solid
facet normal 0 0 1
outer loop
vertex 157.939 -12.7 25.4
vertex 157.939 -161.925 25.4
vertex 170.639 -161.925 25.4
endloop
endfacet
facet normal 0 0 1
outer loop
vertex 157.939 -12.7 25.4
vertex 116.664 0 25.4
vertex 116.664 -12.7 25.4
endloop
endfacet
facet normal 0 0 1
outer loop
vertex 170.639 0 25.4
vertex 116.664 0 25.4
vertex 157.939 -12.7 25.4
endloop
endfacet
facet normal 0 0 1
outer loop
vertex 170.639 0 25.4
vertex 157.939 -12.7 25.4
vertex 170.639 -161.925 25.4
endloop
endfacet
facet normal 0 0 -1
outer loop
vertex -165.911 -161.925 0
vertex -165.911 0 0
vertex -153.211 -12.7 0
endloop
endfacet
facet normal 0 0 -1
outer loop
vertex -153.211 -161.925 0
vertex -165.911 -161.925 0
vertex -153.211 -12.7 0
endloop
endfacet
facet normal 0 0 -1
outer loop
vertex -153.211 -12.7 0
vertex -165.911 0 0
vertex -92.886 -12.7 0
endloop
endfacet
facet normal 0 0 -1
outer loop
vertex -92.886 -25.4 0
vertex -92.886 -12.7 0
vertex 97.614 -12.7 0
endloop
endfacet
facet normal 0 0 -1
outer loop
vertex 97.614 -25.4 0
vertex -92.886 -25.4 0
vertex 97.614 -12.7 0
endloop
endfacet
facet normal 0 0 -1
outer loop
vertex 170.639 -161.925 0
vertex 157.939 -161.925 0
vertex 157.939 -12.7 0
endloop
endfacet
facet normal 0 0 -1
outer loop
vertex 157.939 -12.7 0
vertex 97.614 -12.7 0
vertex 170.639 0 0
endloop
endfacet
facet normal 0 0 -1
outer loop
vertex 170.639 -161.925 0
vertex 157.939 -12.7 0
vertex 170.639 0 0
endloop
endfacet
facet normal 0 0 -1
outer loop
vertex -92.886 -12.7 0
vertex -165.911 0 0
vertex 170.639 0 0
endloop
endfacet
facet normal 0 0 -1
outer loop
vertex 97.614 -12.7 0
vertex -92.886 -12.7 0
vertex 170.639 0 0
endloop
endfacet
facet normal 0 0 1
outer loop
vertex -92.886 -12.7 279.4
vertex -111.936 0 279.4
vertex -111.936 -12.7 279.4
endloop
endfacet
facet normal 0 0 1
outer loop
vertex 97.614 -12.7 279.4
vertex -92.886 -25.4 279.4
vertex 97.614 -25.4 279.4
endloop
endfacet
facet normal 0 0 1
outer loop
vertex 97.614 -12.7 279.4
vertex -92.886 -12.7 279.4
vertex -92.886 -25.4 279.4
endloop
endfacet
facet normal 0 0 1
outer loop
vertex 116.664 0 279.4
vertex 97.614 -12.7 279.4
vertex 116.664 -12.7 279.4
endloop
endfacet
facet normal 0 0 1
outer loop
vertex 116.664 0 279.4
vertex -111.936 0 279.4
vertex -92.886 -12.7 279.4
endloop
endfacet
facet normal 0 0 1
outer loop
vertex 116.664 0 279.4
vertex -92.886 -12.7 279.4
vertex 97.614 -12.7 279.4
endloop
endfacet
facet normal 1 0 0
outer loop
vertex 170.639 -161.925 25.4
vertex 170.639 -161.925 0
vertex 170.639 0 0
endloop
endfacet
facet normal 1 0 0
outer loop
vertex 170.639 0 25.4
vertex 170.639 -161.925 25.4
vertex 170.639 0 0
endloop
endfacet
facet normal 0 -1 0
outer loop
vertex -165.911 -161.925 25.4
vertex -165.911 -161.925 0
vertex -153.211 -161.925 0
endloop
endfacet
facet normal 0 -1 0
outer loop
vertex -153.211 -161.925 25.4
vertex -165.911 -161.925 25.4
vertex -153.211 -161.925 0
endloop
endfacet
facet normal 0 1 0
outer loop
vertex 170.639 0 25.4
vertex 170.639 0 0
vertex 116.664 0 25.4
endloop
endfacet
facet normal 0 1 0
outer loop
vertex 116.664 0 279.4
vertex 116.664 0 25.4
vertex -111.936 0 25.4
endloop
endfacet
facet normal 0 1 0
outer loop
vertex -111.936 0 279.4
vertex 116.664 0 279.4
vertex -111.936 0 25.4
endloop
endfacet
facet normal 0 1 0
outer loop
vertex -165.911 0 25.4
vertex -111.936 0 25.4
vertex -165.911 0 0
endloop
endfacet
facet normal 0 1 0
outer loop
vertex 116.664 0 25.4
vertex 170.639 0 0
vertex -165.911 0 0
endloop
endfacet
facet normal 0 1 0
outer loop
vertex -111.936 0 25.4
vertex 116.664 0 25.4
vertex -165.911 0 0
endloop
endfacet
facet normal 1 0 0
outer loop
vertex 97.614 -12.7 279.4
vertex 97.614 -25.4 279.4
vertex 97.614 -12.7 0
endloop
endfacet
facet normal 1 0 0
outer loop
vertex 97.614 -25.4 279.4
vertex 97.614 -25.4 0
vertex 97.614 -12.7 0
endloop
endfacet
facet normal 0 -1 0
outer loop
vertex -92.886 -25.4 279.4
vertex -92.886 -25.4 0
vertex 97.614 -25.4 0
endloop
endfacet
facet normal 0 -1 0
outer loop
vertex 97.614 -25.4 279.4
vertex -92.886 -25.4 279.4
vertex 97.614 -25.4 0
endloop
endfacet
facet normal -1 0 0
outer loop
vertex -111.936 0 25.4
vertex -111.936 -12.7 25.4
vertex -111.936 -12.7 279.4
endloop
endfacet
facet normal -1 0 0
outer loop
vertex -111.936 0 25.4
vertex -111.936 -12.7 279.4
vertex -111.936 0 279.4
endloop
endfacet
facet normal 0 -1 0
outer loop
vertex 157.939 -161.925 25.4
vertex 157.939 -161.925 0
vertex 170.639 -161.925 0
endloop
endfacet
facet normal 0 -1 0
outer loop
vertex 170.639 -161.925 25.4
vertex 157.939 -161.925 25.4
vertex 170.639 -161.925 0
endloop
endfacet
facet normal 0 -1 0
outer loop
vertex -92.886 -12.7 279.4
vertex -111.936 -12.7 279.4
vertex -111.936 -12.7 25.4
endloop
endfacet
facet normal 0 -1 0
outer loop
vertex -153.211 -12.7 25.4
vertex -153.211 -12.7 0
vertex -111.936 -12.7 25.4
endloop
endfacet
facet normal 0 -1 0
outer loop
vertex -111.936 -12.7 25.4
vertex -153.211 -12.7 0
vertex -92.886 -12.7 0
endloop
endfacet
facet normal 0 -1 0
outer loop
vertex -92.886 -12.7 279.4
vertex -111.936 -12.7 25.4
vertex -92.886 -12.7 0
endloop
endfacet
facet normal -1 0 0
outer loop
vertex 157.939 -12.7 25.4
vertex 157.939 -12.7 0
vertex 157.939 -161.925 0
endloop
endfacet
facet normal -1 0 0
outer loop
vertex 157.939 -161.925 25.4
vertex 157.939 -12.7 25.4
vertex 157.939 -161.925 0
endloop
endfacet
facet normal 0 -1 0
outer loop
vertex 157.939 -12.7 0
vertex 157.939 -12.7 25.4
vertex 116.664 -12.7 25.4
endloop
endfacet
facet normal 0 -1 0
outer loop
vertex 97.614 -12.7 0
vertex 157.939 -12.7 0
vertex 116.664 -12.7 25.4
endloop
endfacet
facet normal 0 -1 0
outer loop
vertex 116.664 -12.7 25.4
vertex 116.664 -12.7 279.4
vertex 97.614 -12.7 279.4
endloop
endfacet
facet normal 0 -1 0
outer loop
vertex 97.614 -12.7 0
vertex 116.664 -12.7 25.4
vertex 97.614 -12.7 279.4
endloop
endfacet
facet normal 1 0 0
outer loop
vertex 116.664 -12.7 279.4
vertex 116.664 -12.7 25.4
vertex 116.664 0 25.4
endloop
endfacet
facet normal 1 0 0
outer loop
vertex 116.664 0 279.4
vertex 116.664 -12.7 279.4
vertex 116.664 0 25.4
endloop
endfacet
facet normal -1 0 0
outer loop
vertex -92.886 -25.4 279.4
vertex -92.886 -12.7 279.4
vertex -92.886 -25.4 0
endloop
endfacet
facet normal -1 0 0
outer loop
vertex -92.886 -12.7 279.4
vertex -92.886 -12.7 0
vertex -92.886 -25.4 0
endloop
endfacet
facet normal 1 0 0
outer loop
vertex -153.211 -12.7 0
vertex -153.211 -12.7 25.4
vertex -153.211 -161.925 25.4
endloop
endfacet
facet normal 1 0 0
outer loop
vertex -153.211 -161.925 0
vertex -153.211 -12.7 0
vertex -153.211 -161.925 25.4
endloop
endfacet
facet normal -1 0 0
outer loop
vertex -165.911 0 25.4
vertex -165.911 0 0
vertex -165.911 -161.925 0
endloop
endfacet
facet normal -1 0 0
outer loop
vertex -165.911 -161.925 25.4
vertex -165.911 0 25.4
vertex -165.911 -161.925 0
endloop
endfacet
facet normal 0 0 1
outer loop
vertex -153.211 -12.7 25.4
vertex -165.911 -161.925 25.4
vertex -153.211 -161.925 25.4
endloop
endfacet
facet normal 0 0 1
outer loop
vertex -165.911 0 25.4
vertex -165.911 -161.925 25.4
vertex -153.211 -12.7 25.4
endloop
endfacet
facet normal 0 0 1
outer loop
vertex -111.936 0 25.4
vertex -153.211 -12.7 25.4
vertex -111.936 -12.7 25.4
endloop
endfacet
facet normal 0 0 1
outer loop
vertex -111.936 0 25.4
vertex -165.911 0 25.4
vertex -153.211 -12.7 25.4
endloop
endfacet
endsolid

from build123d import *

# Parameters (mm, degrees)
F1_DEPTH = 25.4
F2_W     = 190.5
F2_H     = 12.7
F2_W_2   = 19.05
F3_DEPTH = 254
F4_DEPTH = 25.4


with BuildPart() as f1:
    # F0 (on Top) → F1 (new body)
    with BuildSketch(Plane.XY):
        Polygon((170.6390685204, 0), (-165.9109314796, 0), (-165.9109314796, -161.925), (-153.2109314796, -161.925), (-153.2109314796, -25.4), (157.9390685204, -25.4), (157.9390685204, -161.925), (170.6390685204, -161.925), align=None)
    extrude(amount=F1_DEPTH)

    # F2 (on face) → F3 (join)
    with BuildSketch(Plane.XY.offset(25.4)):
        with Locations((2.3640685204, -19.05)):
            Rectangle(F2_W, F2_H)
        with Locations((2.3640685204, -6.35)):
            Rectangle(F2_W, F2_H)
        with Locations((-102.4109314796, -6.35)):
            Rectangle(F2_W_2, F2_H)
        with Locations((107.1390685204, -6.35)):
            Rectangle(F2_W_2, F2_H)
    extrude(amount=F3_DEPTH)

    # F2 (on face) → F4 (cut)
    with BuildSketch(Plane.XY.offset(25.4)):
        Polygon((116.6640685204, -12.7), (97.6140685204, -12.7), (97.6140685204, -25.4), (157.9390685204, -25.4), (157.9390685204, -12.7), align=None)
        Polygon((-92.8859314796, -25.4), (-92.8859314796, -12.7), (-111.9359314796, -12.7), (-153.2109314796, -12.7), (-153.2109314796, -25.4), align=None)
    extrude(amount=-F4_DEPTH, mode=Mode.SUBTRACT)


solid = f1.part
